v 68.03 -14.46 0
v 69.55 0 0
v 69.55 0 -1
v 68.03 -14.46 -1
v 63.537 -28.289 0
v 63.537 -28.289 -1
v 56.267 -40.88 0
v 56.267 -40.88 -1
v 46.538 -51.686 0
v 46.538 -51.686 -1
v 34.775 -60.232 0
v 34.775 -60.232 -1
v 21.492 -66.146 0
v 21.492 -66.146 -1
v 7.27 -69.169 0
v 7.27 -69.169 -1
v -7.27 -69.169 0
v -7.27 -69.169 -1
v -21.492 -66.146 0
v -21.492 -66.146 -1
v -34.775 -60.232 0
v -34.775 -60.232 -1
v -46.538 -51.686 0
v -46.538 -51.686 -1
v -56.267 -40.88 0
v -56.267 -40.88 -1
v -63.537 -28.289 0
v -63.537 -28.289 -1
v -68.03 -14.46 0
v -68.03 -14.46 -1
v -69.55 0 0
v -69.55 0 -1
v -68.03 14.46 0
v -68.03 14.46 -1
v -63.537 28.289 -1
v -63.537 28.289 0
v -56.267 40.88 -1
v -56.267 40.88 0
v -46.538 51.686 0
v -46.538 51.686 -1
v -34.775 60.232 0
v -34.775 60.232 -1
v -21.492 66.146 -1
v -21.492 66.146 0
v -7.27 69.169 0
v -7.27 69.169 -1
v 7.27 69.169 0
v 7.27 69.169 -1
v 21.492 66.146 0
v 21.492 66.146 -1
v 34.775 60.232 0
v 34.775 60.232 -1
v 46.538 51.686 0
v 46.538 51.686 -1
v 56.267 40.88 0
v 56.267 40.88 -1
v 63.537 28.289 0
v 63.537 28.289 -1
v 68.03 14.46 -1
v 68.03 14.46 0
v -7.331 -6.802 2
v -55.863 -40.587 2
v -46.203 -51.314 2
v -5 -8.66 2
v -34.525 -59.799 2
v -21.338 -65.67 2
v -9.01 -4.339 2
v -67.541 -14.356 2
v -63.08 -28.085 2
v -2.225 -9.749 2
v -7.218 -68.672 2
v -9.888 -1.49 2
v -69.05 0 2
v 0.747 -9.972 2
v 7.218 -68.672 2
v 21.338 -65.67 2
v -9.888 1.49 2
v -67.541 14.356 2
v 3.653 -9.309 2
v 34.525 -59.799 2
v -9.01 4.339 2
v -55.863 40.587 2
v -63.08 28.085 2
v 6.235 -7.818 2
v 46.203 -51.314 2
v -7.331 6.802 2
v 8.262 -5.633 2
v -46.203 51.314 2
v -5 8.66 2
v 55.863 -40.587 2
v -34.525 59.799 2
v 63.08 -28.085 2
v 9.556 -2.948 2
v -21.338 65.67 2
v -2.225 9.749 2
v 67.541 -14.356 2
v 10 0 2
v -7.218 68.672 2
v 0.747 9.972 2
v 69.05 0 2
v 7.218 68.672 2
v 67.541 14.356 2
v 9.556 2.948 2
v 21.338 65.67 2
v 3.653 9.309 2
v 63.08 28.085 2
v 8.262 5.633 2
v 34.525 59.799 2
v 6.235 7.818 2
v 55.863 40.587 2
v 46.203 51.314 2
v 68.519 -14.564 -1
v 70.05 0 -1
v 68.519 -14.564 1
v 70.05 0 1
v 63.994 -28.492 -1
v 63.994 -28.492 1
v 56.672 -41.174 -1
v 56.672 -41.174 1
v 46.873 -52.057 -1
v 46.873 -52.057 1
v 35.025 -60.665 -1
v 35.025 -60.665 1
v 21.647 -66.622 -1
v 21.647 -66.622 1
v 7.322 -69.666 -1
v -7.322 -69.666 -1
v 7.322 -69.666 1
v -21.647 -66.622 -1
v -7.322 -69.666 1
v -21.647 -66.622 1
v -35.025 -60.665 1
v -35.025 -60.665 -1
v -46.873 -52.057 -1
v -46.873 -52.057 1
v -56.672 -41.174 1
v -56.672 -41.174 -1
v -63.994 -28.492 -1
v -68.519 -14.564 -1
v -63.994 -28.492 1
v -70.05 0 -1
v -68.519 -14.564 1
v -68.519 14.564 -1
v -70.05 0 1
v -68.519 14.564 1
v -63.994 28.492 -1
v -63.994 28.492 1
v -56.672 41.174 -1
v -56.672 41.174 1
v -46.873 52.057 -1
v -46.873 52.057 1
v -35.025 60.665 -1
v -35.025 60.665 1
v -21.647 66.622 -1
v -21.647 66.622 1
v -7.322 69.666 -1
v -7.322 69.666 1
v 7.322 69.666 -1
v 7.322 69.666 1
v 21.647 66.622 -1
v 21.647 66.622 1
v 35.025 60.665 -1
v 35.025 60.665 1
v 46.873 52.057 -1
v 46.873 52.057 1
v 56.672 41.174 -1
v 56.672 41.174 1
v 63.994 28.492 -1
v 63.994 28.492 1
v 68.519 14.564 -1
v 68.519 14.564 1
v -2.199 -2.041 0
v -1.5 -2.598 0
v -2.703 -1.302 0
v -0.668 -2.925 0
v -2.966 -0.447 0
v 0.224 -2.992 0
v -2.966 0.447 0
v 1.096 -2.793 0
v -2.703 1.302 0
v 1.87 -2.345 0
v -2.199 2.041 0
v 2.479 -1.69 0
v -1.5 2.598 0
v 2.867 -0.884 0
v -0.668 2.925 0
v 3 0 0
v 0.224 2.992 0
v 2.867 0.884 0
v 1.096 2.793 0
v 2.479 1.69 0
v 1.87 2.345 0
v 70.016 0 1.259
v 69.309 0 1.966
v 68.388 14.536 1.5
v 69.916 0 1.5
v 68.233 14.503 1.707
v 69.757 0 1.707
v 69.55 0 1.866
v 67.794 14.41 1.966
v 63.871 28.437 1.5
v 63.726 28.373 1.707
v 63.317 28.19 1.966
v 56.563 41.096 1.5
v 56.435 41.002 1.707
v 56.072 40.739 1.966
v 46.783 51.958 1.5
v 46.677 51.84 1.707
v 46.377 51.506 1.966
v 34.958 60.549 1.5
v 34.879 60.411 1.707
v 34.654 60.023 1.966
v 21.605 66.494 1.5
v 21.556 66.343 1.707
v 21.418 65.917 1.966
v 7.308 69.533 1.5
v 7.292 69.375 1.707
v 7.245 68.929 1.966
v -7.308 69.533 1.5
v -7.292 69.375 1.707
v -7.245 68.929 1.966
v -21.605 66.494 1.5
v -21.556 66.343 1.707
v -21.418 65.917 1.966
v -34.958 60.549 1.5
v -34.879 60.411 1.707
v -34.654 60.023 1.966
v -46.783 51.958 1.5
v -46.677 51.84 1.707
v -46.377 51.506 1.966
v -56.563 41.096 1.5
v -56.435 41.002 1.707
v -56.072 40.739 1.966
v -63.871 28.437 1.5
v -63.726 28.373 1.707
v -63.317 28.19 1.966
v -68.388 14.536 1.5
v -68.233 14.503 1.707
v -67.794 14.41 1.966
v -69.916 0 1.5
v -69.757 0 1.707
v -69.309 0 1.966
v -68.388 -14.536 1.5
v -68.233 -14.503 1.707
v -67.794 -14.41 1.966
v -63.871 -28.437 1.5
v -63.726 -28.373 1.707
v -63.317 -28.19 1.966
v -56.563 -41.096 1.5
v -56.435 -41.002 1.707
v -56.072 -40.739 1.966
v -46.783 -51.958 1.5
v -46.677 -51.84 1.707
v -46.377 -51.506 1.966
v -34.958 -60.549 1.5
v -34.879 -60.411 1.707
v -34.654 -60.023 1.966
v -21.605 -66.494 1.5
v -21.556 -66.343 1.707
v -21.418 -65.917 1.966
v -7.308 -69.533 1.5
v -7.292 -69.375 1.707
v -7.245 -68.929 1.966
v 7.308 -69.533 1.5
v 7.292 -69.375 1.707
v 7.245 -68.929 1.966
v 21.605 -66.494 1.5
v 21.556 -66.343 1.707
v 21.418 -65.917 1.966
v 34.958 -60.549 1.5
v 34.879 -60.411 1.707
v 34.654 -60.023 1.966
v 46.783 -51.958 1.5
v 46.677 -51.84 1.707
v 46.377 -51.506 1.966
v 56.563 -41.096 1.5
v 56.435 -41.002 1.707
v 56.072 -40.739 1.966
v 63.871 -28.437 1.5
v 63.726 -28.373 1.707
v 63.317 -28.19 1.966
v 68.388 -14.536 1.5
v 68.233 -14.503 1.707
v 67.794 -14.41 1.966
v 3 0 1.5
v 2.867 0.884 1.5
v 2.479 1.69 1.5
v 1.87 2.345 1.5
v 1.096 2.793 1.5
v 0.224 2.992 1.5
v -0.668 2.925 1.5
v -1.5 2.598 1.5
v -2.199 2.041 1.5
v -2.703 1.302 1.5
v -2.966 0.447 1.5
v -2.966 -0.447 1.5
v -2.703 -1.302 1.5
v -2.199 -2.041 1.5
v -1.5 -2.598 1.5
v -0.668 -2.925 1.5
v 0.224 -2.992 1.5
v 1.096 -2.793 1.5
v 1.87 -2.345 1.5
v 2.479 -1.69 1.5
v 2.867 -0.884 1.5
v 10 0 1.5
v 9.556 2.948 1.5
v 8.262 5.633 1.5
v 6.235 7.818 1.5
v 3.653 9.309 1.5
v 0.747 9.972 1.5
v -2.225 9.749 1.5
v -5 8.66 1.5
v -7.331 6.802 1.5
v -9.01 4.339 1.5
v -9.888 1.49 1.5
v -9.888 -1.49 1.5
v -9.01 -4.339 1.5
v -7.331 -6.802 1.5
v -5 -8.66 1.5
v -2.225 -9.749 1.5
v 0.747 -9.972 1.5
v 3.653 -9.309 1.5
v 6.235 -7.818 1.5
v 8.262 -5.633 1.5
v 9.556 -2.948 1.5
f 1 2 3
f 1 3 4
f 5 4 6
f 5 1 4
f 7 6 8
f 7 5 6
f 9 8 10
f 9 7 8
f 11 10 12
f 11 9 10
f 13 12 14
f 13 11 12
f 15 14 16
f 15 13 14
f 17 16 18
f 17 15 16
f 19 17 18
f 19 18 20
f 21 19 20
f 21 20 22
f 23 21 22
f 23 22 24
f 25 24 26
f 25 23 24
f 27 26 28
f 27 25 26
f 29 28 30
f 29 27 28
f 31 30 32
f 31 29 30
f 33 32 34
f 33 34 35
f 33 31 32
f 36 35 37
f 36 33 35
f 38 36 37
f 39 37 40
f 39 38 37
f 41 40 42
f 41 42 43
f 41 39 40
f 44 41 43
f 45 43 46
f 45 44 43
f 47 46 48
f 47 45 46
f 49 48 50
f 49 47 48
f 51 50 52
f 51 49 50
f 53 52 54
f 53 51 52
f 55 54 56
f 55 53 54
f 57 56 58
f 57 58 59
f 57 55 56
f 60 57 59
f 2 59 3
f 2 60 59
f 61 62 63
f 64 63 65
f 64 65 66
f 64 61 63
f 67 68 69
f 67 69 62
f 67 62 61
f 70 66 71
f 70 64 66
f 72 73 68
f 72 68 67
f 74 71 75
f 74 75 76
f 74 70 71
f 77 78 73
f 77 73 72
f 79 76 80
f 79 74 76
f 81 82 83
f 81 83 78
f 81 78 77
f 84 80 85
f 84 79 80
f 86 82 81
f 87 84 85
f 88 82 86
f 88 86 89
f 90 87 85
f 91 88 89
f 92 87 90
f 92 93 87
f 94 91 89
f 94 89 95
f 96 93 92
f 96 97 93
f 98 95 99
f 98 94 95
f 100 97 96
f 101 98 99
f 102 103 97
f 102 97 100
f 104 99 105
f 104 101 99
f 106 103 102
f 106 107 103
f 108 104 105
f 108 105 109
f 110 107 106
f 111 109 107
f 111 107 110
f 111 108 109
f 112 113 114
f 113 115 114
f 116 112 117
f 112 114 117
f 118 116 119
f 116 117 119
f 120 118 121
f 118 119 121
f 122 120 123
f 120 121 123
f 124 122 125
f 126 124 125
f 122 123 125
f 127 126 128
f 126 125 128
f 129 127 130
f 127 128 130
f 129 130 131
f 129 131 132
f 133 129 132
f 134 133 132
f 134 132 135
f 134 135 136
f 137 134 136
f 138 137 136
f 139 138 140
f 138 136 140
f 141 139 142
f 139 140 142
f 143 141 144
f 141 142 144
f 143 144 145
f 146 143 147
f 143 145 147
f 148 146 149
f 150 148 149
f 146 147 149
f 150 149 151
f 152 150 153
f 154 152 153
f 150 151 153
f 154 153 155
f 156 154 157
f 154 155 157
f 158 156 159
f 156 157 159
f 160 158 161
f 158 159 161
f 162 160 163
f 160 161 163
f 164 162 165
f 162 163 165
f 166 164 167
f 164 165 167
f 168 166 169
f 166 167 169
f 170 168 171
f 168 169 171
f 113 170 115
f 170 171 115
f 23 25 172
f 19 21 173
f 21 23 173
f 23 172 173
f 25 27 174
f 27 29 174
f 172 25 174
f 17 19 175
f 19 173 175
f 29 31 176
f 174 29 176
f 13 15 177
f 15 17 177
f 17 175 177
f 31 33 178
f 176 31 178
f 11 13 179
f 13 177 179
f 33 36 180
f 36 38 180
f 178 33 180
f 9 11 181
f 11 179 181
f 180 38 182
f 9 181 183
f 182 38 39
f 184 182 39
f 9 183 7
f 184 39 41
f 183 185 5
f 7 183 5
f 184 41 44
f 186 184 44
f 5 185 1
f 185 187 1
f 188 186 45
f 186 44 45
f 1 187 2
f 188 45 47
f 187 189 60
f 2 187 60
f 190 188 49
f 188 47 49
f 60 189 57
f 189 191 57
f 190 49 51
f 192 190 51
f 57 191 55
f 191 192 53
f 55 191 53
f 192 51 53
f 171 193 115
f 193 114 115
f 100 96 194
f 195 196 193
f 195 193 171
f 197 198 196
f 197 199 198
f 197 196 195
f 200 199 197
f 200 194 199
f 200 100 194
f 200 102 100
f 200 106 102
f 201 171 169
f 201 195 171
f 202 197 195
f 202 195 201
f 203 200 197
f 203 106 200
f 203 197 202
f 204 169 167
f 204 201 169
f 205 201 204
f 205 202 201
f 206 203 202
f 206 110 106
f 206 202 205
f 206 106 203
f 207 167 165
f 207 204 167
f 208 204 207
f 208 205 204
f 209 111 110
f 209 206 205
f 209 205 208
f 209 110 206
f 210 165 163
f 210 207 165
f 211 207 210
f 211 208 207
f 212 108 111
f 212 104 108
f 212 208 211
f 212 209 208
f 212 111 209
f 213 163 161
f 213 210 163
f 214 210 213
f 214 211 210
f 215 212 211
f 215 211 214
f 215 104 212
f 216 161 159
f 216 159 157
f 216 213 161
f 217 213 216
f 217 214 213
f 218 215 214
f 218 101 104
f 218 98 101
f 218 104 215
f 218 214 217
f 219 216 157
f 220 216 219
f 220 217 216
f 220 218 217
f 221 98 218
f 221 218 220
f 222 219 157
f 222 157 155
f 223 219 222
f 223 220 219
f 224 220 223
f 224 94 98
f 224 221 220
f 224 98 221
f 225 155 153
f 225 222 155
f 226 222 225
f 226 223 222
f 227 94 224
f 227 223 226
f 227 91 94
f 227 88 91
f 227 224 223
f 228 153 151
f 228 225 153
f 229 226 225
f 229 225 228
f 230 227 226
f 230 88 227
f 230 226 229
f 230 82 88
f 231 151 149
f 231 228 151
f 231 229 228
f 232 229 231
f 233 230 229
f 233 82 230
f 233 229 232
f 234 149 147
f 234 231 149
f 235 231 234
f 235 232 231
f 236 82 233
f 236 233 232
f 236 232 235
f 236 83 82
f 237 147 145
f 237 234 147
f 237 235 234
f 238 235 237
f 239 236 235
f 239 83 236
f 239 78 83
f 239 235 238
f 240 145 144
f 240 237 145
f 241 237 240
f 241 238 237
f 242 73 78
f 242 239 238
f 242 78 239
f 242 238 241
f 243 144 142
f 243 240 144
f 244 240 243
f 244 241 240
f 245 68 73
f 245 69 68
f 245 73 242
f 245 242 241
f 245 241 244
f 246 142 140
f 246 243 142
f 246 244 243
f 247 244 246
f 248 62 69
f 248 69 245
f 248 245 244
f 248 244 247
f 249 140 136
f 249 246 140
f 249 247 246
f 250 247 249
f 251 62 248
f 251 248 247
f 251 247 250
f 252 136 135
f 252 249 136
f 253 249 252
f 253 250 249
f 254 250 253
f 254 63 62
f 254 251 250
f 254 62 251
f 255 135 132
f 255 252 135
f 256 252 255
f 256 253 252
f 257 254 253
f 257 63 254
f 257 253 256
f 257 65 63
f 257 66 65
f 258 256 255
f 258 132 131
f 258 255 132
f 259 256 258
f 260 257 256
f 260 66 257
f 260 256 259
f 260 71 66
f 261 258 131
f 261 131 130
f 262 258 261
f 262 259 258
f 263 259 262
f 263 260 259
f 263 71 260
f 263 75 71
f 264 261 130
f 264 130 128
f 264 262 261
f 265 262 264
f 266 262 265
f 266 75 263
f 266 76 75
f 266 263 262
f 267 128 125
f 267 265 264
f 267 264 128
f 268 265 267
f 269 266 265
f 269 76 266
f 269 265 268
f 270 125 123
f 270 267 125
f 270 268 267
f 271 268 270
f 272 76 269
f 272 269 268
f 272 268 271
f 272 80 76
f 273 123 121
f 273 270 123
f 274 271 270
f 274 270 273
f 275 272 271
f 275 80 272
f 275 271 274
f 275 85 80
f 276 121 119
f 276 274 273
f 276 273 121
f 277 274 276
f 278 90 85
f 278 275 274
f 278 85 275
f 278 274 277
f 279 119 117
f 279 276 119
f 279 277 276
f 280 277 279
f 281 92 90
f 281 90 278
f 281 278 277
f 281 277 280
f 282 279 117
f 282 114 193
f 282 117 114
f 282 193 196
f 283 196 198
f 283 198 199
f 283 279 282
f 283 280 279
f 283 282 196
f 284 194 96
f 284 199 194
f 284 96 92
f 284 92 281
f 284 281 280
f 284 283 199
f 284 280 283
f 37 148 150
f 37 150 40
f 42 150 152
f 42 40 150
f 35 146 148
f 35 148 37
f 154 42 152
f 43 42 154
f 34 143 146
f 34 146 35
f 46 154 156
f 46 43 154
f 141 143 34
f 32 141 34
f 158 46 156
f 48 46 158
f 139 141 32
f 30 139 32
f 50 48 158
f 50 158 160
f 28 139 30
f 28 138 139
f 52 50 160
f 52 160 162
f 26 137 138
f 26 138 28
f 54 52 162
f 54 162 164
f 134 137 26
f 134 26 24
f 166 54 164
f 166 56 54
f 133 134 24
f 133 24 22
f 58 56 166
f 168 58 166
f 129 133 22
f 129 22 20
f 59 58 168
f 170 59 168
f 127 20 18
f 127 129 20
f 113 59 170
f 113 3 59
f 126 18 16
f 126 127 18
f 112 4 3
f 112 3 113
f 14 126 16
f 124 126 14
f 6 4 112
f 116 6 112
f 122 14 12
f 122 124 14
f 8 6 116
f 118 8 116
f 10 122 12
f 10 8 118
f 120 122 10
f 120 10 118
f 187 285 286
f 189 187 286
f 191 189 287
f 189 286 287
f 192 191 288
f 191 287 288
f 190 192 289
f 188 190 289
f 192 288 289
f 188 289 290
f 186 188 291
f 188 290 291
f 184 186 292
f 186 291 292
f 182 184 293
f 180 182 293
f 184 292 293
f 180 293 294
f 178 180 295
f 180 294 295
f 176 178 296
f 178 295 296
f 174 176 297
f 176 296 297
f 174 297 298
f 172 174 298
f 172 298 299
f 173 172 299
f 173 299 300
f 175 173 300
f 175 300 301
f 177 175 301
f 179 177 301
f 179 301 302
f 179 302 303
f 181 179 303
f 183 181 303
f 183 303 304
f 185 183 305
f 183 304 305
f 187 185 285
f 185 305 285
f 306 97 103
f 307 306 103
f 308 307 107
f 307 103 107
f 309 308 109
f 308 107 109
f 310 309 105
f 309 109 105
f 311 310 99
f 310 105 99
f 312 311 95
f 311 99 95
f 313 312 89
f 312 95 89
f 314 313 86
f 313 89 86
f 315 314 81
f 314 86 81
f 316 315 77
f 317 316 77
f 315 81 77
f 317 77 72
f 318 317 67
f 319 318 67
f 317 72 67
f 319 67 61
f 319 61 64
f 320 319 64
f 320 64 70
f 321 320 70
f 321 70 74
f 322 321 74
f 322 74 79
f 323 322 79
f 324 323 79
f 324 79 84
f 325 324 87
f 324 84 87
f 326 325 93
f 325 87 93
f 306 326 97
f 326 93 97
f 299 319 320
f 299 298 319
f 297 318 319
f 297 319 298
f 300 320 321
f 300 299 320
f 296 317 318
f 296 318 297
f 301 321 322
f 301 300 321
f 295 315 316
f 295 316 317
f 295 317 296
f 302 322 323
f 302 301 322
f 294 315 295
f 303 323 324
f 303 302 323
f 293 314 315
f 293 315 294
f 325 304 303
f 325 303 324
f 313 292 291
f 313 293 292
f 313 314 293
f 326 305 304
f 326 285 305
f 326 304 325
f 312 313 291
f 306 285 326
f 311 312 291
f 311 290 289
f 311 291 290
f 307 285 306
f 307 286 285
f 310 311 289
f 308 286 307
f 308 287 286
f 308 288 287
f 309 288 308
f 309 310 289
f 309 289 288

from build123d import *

# Parameters (mm, degrees)
F0_R     = 70.05
F1_DEPTH = 2
F2_R     = 1
F3_R     = 70.05
F3_R_2   = 69.55
F4_DEPTH = 1
F5_R     = 10
F6_DEPTH = 0.5
F7_R     = 3
F8_DEPTH = 1.5


with BuildPart() as f1:
    # F0 (on Top) → F1 (new body)
    with BuildSketch(Plane.XY):
        Circle(F0_R)
    extrude(amount=F1_DEPTH)

    # F2
    f2_edges = [f1.edges().sort_by_distance(p)[0] for p in [
        (-70.05, 0, 2),
    ]]
    fillet(f2_edges, radius=F2_R)

    # F3 (on face) → F4 (join)
    with BuildSketch(Plane(origin=(0, 0, 0), x_dir=(1, 0, 0), z_dir=(0, 0, -1))):
        Circle(F3_R)
        Circle(F3_R_2, mode=Mode.SUBTRACT)
    extrude(amount=F4_DEPTH)

    # F5 (on face) → F6 (cut)
    with BuildSketch(Plane.XY.offset(2)):
        Circle(F5_R)
    extrude(amount=-F6_DEPTH, mode=Mode.SUBTRACT)

    # F7 (on face) → F8 (cut, through all)
    with BuildSketch(Plane.XY.offset(1.5)):
        Circle(F7_R)
    extrude(amount=-F8_DEPTH, mode=Mode.SUBTRACT)


solid = f1.part
